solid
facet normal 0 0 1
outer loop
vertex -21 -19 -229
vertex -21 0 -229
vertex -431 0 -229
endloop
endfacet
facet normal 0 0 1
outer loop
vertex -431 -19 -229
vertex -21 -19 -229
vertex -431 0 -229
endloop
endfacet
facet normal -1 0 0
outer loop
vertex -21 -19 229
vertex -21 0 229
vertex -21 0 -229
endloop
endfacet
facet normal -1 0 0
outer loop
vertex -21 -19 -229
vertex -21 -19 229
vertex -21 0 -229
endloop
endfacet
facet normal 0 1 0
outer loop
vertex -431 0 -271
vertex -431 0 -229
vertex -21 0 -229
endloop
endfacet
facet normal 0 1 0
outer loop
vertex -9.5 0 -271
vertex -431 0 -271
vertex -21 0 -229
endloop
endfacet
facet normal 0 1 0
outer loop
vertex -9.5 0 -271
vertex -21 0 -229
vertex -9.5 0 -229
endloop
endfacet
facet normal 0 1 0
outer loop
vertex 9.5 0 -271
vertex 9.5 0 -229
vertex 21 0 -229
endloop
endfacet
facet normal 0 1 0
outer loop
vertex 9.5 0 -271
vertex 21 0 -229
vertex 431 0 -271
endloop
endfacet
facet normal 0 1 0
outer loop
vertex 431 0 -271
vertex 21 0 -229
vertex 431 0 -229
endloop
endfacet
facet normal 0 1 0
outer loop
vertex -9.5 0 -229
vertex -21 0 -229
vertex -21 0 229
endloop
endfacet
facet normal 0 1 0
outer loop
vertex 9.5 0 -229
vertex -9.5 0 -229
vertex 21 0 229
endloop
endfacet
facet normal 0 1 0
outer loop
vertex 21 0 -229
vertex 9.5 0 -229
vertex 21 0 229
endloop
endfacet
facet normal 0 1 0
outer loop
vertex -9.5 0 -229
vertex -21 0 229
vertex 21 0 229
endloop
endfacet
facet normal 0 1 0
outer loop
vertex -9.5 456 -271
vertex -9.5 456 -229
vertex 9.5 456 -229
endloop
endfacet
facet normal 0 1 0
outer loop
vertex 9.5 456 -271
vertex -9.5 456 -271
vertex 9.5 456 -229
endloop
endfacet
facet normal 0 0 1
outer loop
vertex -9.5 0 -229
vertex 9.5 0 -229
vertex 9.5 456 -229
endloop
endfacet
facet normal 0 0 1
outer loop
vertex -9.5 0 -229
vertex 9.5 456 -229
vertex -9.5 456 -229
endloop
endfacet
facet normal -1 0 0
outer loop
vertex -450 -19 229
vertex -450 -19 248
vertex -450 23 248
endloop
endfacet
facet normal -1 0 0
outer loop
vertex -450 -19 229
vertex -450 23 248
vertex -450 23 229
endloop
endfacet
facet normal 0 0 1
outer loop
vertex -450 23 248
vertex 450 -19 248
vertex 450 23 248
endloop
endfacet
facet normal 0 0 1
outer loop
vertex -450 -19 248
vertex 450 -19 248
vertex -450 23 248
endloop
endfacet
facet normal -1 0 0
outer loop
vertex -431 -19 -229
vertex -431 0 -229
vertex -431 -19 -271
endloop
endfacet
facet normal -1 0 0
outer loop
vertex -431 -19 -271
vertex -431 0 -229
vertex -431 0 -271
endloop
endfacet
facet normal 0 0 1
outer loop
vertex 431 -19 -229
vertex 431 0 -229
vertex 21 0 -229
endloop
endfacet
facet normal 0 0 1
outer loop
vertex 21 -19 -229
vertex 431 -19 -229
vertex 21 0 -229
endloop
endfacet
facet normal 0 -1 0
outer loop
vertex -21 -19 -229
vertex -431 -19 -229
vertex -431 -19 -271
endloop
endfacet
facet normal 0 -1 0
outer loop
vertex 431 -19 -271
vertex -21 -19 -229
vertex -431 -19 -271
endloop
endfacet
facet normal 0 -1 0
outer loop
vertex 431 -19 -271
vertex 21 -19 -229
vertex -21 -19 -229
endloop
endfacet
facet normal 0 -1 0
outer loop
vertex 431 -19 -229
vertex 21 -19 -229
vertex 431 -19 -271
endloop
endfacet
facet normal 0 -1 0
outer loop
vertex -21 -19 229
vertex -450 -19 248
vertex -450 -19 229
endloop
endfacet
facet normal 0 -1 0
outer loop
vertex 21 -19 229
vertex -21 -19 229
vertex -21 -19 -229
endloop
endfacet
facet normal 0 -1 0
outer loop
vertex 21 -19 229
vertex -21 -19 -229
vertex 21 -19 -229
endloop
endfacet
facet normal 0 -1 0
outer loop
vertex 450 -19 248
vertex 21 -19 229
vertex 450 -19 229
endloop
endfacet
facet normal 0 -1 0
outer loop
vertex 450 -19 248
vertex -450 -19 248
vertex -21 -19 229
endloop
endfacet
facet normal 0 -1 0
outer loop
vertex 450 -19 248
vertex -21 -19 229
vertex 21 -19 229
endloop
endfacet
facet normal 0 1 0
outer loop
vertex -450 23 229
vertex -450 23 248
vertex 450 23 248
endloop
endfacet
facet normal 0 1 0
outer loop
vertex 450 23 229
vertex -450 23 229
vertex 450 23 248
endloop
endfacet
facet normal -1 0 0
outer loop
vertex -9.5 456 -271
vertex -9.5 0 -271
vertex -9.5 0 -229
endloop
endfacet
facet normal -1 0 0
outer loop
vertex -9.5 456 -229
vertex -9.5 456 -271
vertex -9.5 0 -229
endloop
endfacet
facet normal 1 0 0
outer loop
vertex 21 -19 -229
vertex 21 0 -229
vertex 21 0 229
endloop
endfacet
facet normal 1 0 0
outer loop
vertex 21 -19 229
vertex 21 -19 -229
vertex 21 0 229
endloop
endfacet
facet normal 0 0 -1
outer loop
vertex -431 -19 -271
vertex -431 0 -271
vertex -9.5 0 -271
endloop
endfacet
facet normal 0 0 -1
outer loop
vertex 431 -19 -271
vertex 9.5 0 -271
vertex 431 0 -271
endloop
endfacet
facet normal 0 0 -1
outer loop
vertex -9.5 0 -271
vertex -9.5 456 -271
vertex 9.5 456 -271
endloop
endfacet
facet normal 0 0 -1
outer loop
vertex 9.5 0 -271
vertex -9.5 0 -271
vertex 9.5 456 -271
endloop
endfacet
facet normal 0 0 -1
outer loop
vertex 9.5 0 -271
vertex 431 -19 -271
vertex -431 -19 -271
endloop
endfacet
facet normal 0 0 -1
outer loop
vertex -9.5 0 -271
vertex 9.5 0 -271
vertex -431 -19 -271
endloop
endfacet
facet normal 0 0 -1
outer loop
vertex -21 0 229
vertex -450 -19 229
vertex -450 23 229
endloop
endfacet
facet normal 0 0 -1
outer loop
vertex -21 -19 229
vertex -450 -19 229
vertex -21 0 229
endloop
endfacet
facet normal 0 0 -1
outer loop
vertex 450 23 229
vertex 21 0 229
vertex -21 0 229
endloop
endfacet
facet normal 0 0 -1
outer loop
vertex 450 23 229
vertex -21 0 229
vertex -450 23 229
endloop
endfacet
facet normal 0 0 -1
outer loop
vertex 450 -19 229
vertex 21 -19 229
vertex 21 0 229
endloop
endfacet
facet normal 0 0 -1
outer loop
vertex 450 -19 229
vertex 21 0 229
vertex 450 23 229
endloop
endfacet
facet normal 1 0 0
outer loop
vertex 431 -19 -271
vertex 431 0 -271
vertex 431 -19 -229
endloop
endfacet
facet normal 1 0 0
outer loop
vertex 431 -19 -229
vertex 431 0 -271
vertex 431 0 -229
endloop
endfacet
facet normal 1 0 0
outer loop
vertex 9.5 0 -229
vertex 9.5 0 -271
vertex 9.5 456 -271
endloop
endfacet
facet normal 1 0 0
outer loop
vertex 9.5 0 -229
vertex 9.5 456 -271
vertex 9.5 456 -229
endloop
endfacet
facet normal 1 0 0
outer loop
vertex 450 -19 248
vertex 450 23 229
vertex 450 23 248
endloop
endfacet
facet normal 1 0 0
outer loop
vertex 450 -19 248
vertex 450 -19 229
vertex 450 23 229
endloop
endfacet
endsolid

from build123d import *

# Parameters (mm, degrees)
F0_W     = 9.5
F0_H     = 42
F1_DEPTH = 19
F2_DEPTH = 456
F3_DEPTH = 23


with BuildPart() as f1:
    # F0 (on Front) → F1 (new body)
    with BuildSketch(Plane.XZ):
        Polygon((431, -229), (21, -229), (9.5, -229), (9.5, -271), (431, -271), align=None)
        Polygon((9.5, -229), (21, -229), (21, 229), (0, 229), (-21, 229), (-21, -229), (-9.5, -229), (0, -229), align=None)
        with Locations((4.75, -250)):
            Rectangle(F0_W, F0_H)
        Polygon((0, 229), (21, 229), (450, 229), (450, 248), (0, 248), align=None)
        with Locations((-4.75, -250)):
            Rectangle(F0_W, F0_H)
        Polygon((-21, 229), (0, 229), (0, 248), (-450, 248), (-450, 229), align=None)
        Polygon((-9.5, -271), (-9.5, -229), (-21, -229), (-431, -229), (-431, -271), align=None)
    extrude(amount=F1_DEPTH)

    # F0 (on Front) → F2 (join)
    with BuildSketch(Plane.XZ):
        with Locations((-4.75, -250)):
            Rectangle(F0_W, F0_H)
        with Locations((4.75, -250)):
            Rectangle(F0_W, F0_H)
    extrude(amount=-F2_DEPTH)

    # F0 (on Front) → F3 (join)
    with BuildSketch(Plane.XZ):
        Polygon((0, 229), (21, 229), (450, 229), (450, 248), (0, 248), align=None)
        Polygon((-21, 229), (0, 229), (0, 248), (-450, 248), (-450, 229), align=None)
    extrude(amount=-F3_DEPTH)


solid = f1.part
